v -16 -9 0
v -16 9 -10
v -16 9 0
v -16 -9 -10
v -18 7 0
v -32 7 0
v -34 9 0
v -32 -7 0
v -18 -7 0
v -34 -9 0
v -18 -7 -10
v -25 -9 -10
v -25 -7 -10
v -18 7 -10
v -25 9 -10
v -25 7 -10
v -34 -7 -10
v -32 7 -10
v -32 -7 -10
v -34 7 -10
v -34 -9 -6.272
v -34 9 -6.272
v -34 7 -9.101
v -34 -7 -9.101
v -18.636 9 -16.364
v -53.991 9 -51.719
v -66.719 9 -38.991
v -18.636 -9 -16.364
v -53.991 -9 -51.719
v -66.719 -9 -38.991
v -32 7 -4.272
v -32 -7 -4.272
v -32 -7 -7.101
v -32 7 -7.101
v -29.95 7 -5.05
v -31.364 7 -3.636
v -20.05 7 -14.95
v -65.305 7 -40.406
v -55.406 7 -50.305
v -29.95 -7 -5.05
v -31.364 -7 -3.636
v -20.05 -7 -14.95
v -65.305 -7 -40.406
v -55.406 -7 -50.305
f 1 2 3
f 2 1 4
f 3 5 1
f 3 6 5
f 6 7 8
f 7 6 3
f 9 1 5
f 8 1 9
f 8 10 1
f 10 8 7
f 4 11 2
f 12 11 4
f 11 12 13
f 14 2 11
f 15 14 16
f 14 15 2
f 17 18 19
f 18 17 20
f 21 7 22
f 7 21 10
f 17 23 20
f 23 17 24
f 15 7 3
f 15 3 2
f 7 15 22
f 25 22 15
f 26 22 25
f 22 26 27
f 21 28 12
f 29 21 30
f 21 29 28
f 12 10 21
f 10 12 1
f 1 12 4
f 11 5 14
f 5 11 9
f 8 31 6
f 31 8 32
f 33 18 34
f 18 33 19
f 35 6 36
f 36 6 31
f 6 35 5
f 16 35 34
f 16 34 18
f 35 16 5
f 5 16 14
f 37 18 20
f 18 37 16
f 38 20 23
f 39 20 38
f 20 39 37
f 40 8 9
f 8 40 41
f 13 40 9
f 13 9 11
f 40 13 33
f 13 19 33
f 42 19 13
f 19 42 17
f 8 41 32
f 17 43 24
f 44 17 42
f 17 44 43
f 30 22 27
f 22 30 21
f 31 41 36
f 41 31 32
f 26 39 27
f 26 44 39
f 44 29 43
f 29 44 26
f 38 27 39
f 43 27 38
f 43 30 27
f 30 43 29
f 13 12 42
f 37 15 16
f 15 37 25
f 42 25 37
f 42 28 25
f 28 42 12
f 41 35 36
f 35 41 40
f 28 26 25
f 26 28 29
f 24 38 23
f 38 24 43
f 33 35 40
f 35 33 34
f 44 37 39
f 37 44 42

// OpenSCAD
// file: params.scad
// Shared parameters for the pill-metering module. All units mm.
$fn = 72;

pill_type = "tablet";      // "tablet" or "capsule"
pill_length = 8;           // pill length
pill_width = 8;            // pill width
pill_thickness = 4;        // pill thickness
// Capsule preset: pill_type="capsule"; pill_length=21.7; pill_width=7.6; pill_thickness=7.6;

pocket_w = pill_width + 0.5;          // pocket width
pocket_l = pill_length + 0.5;         // pocket length
pocket_depth = pill_thickness + 0.3;  // pocket depth

disk_d = 64;                          // disk diameter
disk_gap = 0.5;                       // disk top sits this far below plate top (wiper reaches through)
disk_floor = 2;                       // material under pocket
disk_t = pocket_depth + disk_floor;   // disk thickness
pocket_r = 25;                        // disk center to pocket center
disk_recess_clear = 0.3;              // radial clearance in plate recess

plate_w = 90;                         // plate square size
plate_t = 5;                          // plate thickness under disk
recess_depth = disk_t + disk_gap;     // recess depth in plate top
plate_h = plate_t + recess_depth;     // total plate block height
recess_d = disk_d + 2 * disk_recess_clear; // recess diameter

drop_hole_d = max(pocket_l, pocket_w) + 1; // drop hole diameter (at 180 deg)

hopper_id = 36;                     // hopper inner diameter
hopper_wall = 2;                      // hopper wall thickness
hopper_h = 60;                        // hopper tube height
hopper_outlet_d = max(pocket_l, pocket_w) + 2; // outlet diameter at (pocket_r,0)
hopper_taper_h = 20;                  // tapered bottom height
hopper_offset = 7;                    // tube center = pocket_r - 7 = 18
hopper_flange_d = 84;                 // flange diameter
flange_t = 3;                         // flange thickness
hopper_bolt_circle_d = 76;            // bolt circle diameter (r=38)
bolt_d = 3.4;                         // hopper flange bolt hole
insert_bore_d = 4.5;                  // plate bore (heat-set insert)
corner_hole_d = 3.4;                  // enclosure mount holes
corner_inset = 5;                    // corner hole inset from edge

wiper_w = 1.2;                        // wiper slot width
wiper_depth = 10;                     // wiper slot depth
wiper_len = hopper_outlet_d + 4;      // wiper slot length (along X)

motor_body_d = 28;                    // 28BYJ-48 body diameter
motor_body_h = 19;                    // body height
motor_ear_span = 35;                  // mount ear spacing
motor_ear_hole = 4.2;                 // ear hole diameter
shaft_d = 5;                          // D-shaft diameter
shaft_flat = 3;                       // across-flats dimension
shaft_offset = 8;                     // shaft offset from body center
shaft_len = 10;                       // shaft length
shaft_clear = 0.2;                    // socket clearance

chute_inner = 14;                     // chute inner square
chute_wall = 2;                       // chute wall
chute_angle = 45;                     // outward angle
chute_len = 50;                       // chute length
// main file
// Chute: 10 mm vertical section under the drop hole, then a 45 deg run toward -X.
// Origin: plate bottom at z=0; drop hole center at (-pocket_r, 0). Duct hangs below z=0.
include <params.scad>

outer = chute_inner + 2 * chute_wall;   // 18 -> y span +/-9
straight_len = 10;

module duct(l) {
    // hollow square duct along +Z from z=0 to z=l
    difference() {
        translate([-outer / 2, -outer / 2, 0]) cube([outer, outer, l]);
        translate([-chute_inner / 2, -chute_inner / 2, -1]) cube([chute_inner, chute_inner, l + 2]);
    }
}

module chute() {
    translate([-pocket_r, 0, 0]) {
        // vertical section, top face flush with plate underside (z=0)
        translate([0, 0, -straight_len]) duct(straight_len);
        // angled run from the bottom of the vertical section, heading down and toward -X
        translate([0, 0, -straight_len])
            rotate([0, 180 + chute_angle, 0]) duct(chute_len);
    }
}

chute();
